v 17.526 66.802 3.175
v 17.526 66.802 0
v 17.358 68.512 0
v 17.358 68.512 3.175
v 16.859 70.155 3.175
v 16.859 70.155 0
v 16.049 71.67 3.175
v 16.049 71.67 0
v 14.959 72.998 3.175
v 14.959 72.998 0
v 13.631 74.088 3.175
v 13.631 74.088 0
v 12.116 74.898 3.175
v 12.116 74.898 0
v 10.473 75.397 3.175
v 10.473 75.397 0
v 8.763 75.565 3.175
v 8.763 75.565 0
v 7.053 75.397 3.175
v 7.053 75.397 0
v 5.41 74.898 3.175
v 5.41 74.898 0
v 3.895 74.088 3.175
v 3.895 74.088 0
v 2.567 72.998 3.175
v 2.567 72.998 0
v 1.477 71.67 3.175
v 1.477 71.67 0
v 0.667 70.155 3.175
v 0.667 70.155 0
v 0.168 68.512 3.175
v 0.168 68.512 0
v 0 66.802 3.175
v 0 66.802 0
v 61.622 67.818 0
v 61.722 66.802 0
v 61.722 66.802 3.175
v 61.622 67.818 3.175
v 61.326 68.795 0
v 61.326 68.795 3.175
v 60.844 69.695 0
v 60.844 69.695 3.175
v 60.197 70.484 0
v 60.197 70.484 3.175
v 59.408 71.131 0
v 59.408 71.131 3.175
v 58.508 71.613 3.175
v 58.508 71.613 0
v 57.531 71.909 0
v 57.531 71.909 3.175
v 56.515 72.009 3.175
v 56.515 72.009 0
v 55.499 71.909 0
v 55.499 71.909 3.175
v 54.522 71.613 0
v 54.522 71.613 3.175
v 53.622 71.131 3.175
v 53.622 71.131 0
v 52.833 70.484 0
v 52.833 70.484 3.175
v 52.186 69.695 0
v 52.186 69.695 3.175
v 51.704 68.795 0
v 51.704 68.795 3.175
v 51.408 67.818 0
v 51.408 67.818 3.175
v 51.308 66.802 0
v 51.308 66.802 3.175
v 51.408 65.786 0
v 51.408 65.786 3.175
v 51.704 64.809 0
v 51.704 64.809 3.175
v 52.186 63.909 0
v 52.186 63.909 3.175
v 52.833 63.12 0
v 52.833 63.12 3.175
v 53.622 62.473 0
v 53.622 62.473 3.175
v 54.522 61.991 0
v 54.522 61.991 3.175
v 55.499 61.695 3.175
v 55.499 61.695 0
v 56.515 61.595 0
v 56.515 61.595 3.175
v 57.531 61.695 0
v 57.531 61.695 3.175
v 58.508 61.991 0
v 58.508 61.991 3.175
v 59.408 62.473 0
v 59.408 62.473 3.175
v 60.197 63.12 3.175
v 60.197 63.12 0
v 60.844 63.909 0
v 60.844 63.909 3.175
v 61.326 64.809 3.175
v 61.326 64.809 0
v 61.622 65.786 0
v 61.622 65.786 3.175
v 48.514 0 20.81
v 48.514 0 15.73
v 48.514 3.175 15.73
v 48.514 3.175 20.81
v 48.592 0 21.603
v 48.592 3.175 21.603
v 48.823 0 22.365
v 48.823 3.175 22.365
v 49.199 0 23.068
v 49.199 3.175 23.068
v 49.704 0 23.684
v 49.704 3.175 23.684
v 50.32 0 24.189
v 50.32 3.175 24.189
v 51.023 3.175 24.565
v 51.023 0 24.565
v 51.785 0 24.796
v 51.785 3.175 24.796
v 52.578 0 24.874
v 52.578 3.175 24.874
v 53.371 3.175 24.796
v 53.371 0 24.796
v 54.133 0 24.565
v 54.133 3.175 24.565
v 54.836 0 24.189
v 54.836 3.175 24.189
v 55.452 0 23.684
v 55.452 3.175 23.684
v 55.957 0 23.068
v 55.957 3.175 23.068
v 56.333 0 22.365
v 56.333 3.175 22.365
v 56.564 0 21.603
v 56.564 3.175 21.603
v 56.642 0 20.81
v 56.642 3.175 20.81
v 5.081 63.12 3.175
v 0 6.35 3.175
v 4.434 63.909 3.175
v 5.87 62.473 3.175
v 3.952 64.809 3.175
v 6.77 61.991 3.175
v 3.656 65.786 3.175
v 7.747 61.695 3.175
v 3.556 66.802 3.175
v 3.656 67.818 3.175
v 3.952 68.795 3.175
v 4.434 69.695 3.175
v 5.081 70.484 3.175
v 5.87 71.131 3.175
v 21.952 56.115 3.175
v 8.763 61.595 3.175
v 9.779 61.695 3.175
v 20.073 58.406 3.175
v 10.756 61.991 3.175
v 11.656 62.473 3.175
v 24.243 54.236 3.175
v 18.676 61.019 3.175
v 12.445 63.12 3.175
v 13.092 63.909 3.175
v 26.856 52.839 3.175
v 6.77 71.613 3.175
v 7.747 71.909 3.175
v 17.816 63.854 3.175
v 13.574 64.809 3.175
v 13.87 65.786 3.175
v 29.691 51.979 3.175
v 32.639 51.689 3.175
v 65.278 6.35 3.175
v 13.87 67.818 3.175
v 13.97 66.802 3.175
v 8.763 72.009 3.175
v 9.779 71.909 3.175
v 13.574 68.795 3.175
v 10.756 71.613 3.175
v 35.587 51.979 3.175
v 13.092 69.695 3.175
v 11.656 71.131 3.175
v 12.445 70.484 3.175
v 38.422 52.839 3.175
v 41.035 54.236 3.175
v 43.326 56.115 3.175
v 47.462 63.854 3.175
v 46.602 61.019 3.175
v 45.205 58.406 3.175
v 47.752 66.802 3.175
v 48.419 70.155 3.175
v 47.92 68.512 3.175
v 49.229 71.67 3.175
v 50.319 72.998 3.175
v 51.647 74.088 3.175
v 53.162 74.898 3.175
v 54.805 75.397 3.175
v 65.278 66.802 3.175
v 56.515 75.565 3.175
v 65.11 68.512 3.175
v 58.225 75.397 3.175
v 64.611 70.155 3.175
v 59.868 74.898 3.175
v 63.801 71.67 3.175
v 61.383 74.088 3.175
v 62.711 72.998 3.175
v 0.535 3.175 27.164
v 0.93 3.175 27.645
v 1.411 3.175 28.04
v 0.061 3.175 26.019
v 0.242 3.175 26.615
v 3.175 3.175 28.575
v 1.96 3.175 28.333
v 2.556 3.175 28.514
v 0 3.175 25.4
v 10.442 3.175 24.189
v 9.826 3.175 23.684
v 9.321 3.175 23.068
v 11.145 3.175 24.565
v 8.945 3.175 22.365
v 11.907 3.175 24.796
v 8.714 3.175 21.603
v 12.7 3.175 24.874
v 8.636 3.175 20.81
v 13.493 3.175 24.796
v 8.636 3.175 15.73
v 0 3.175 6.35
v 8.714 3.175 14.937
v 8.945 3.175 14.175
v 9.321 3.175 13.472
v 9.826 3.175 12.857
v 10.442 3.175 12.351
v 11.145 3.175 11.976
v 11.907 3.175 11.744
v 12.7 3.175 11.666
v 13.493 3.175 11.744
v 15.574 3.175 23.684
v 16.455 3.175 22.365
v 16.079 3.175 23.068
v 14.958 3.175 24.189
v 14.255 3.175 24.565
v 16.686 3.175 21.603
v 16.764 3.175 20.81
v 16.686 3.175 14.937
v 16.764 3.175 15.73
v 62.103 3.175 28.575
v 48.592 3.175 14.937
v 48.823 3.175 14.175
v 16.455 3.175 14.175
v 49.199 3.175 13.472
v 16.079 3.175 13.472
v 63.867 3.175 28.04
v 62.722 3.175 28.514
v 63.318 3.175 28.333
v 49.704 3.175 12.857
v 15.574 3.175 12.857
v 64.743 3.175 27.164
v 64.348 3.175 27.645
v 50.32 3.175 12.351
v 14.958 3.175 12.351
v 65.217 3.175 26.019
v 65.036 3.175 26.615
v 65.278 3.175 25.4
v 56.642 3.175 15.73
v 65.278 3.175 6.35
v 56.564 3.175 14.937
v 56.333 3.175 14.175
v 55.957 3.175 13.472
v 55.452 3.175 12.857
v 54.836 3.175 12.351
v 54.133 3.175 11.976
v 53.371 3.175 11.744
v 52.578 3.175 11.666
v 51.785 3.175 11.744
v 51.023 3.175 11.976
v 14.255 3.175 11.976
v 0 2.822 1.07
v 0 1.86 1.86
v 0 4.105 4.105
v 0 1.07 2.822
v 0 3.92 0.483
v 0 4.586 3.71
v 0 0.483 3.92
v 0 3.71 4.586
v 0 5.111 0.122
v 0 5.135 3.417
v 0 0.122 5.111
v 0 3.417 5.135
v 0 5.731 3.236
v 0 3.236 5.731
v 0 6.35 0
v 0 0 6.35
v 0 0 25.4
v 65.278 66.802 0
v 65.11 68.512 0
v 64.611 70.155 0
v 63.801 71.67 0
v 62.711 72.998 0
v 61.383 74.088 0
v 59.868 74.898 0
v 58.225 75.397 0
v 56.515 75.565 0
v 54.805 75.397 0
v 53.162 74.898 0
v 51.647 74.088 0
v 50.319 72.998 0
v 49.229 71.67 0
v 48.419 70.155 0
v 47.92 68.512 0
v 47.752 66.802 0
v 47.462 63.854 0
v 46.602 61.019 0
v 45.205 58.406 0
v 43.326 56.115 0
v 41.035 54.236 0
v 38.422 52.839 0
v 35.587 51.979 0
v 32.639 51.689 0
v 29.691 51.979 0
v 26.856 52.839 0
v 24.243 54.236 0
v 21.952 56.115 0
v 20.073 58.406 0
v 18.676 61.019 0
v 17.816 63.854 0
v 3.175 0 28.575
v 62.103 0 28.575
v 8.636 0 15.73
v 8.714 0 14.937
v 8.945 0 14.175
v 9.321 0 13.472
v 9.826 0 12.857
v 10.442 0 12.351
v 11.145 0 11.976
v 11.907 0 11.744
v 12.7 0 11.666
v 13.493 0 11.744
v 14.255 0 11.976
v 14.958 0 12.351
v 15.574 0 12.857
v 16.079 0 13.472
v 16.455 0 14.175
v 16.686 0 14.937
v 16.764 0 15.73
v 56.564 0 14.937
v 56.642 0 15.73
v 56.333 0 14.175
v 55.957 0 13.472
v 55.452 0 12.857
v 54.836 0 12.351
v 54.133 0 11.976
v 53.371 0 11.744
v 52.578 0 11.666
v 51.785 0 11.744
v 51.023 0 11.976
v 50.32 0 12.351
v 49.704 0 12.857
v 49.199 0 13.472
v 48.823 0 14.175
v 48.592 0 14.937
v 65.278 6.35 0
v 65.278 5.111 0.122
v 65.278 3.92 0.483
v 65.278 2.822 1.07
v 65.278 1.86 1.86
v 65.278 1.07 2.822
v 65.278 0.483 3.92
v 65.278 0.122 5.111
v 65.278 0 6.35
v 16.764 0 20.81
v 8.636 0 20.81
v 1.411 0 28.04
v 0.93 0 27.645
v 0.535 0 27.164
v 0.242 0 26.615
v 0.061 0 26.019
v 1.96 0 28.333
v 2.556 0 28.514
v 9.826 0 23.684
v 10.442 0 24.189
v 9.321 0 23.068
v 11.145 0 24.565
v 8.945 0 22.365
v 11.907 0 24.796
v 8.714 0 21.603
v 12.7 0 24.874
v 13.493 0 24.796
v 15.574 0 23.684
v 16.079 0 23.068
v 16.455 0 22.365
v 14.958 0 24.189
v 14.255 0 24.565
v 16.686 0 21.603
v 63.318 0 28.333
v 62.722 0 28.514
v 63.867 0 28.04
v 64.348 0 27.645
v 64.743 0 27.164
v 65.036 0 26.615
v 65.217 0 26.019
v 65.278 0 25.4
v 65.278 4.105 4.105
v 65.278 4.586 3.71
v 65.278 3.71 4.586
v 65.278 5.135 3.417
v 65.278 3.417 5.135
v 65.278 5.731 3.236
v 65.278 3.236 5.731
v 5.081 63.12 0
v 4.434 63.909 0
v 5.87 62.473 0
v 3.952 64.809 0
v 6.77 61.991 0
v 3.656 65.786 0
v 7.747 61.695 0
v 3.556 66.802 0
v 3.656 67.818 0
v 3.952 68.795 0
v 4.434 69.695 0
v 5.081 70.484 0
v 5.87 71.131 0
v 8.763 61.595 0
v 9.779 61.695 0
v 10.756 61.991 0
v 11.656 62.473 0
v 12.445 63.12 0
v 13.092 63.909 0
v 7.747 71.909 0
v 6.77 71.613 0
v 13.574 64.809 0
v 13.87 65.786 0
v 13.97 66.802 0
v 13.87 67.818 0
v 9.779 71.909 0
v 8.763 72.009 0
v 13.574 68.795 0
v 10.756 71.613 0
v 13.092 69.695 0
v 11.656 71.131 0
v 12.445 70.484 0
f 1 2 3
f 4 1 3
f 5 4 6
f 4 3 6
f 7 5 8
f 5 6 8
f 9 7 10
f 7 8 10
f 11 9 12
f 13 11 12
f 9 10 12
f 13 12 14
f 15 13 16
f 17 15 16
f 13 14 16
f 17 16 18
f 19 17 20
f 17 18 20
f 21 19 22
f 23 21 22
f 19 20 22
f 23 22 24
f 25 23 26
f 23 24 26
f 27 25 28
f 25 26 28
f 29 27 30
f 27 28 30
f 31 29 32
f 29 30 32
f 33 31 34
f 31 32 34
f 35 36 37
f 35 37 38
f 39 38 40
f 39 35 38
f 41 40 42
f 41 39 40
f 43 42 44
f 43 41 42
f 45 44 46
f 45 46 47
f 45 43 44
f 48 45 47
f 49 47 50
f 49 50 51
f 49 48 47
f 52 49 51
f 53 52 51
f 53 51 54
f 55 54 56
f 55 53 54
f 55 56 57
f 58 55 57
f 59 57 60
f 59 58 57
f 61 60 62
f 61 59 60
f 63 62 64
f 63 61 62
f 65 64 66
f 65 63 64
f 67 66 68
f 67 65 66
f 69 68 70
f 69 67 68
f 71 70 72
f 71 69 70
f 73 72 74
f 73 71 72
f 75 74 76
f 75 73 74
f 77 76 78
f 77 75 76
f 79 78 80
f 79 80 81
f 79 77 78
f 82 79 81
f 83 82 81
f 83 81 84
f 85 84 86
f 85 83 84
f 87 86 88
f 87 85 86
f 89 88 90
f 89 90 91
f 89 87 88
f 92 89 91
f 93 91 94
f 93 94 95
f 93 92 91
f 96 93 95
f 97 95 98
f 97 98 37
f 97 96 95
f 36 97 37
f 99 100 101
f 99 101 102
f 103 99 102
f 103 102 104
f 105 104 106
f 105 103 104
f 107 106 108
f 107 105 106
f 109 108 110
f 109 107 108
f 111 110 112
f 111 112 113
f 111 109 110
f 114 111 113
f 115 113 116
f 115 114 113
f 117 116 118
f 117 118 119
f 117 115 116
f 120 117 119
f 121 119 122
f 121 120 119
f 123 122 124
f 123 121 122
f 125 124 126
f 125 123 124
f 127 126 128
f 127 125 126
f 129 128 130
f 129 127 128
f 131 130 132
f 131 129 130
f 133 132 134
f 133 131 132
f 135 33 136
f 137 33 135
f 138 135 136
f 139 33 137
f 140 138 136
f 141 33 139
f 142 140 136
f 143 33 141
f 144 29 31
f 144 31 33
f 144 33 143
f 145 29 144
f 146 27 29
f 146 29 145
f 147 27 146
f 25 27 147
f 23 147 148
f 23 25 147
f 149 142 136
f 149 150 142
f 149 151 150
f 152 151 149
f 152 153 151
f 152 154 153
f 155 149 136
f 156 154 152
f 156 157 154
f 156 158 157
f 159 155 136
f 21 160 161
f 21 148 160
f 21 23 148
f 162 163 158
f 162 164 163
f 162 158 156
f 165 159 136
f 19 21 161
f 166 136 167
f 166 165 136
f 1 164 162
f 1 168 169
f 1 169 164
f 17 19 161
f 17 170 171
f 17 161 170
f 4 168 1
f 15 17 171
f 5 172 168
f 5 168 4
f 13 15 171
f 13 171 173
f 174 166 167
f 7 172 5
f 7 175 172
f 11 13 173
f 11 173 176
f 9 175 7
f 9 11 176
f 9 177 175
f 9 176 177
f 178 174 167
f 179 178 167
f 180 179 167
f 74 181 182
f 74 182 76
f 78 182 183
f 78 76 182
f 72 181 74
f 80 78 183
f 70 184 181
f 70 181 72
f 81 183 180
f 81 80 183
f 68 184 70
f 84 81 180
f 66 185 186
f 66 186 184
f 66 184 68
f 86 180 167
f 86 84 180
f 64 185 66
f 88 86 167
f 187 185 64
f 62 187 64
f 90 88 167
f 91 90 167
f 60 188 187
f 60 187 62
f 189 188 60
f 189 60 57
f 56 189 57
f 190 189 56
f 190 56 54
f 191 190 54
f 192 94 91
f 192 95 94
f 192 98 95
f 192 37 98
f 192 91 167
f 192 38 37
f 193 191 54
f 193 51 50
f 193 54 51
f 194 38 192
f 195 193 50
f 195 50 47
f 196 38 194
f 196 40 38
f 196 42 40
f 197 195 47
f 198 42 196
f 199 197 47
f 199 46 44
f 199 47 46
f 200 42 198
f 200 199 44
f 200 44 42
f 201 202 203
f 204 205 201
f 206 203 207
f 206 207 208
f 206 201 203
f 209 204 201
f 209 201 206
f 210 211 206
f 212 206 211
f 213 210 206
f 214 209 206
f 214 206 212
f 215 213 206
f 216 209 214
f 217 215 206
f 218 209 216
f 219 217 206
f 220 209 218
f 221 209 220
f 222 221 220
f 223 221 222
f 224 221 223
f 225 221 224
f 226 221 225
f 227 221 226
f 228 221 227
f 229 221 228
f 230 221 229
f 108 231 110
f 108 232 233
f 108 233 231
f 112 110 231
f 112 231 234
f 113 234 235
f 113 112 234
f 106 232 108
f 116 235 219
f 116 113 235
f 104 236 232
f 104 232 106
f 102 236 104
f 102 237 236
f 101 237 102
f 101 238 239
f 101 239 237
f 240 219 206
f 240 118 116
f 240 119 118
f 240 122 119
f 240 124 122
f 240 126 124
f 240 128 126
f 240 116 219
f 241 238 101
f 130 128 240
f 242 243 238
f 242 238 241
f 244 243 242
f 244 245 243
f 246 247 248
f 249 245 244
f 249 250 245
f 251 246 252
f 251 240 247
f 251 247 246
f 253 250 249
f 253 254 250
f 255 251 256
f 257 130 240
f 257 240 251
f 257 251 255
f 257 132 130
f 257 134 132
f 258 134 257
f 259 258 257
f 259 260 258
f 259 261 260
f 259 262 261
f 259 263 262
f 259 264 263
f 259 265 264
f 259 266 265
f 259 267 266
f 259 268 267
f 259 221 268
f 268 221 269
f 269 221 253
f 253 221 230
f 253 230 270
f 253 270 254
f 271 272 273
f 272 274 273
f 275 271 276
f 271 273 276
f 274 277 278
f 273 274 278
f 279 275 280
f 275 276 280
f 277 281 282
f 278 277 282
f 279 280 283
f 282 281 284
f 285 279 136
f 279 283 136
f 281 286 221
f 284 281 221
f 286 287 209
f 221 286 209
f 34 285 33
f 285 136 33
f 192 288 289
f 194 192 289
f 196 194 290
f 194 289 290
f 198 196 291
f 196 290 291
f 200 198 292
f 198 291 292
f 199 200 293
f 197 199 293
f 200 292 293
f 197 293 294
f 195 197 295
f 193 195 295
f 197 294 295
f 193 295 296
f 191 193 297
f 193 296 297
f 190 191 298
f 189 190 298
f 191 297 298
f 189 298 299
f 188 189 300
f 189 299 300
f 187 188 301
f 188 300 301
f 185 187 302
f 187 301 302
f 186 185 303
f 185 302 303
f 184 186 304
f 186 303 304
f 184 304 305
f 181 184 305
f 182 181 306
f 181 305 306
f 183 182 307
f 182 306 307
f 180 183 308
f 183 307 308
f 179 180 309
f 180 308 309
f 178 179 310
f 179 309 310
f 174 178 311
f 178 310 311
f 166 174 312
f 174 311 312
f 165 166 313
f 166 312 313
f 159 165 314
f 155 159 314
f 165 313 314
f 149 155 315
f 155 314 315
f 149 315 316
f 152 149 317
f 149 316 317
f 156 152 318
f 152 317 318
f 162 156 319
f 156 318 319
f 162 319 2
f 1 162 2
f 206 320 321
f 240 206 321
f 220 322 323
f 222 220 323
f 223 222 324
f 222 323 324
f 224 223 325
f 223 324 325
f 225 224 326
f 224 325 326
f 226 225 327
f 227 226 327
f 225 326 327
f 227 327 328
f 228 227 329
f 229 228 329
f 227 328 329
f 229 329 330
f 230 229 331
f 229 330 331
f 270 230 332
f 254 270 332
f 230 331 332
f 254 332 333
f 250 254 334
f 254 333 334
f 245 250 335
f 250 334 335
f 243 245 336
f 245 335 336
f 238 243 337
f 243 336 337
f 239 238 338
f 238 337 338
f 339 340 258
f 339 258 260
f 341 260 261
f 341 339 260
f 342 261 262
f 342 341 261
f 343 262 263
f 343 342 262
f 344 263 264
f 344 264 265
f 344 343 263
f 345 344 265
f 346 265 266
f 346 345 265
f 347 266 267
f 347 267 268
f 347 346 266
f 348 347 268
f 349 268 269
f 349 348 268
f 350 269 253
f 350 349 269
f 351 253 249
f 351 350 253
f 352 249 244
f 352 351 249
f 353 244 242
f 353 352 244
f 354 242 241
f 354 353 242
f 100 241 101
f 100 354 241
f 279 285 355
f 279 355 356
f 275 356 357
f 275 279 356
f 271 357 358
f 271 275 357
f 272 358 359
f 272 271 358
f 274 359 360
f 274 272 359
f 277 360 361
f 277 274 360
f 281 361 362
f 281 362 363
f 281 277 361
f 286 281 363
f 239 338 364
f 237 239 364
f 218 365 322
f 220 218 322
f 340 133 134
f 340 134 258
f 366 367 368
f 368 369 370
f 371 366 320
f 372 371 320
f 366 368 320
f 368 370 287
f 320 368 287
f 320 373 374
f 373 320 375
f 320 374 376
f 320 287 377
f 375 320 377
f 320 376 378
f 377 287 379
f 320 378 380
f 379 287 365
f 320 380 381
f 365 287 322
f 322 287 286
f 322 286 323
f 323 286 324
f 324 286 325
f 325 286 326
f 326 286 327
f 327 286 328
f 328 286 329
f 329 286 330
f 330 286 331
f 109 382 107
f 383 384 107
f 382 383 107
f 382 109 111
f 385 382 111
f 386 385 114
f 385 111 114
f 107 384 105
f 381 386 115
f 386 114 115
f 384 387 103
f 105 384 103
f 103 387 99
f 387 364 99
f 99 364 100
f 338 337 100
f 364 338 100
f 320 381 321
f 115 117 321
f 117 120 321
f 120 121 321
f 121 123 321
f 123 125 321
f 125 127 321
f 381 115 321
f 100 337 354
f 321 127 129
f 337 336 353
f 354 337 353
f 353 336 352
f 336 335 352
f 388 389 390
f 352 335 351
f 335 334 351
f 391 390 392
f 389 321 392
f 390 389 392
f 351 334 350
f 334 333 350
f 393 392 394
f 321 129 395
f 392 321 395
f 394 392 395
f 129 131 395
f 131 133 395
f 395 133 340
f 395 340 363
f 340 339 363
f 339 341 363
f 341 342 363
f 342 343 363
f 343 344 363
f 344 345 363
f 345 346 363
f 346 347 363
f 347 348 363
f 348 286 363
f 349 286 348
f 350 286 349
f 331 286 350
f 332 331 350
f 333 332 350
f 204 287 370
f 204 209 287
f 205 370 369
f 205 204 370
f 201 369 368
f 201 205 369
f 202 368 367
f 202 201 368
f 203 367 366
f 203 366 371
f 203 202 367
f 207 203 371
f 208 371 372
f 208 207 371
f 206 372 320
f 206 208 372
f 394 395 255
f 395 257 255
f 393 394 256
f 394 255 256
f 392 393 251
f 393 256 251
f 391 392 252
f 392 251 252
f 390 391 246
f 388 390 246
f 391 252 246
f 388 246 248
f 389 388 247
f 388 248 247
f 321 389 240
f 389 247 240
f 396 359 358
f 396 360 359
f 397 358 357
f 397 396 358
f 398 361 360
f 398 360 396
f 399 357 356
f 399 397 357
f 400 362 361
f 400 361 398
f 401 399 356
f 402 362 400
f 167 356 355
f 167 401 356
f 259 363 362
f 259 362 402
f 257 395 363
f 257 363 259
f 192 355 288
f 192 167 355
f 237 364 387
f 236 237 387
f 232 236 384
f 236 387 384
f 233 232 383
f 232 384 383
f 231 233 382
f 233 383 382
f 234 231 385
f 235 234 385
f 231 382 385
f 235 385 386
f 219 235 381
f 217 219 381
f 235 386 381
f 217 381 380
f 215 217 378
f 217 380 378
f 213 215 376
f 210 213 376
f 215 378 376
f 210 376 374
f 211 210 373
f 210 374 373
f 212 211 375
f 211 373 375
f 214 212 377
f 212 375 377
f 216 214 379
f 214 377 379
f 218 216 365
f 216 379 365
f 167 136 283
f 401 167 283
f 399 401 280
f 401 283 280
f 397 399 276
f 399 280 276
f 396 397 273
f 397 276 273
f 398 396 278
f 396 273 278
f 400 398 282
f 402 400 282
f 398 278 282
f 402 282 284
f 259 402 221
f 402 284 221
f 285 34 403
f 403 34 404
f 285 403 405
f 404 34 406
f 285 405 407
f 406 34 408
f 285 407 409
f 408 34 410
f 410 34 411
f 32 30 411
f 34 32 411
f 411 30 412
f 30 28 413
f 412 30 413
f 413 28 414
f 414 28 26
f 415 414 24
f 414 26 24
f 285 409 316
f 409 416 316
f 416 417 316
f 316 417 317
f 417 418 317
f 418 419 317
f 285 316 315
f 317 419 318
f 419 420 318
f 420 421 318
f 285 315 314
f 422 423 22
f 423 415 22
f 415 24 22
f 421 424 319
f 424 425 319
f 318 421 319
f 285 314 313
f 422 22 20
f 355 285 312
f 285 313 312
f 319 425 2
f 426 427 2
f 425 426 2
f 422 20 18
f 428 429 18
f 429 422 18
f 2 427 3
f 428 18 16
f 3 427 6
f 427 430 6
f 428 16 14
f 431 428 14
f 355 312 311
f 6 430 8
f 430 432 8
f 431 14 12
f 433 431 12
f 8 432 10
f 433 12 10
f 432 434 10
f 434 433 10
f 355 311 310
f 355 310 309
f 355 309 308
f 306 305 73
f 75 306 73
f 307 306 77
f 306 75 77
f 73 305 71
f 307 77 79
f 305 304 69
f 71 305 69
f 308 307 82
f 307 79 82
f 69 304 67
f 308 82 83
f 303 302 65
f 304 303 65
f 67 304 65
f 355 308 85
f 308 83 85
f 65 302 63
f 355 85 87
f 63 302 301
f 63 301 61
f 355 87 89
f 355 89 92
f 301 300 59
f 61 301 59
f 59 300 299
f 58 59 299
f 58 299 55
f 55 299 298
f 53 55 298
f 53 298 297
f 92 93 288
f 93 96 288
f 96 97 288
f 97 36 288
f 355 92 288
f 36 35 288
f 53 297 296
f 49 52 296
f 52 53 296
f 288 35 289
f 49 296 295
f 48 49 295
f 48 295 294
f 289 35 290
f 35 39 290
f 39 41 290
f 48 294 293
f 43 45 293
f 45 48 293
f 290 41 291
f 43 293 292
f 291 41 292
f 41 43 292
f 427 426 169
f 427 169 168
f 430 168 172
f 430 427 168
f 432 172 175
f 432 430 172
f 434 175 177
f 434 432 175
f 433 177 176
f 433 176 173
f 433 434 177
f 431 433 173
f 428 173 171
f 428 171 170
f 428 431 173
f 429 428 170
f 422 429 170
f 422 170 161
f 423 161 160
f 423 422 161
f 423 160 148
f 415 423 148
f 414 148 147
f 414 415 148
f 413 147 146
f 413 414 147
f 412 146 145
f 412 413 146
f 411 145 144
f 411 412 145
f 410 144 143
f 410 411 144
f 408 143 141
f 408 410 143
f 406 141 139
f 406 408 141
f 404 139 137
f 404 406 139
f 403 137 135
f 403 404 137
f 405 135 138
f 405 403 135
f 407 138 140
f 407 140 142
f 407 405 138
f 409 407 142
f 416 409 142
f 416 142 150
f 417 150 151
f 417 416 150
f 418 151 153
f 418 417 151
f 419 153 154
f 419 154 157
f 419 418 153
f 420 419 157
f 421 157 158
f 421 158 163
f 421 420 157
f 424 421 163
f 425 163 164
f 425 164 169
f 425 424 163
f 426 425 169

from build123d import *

# Parameters (mm, degrees)
SKETCH1_R              = 5.207
BOSS_EXTRUDE1_DEPTH    = 3.175
SKETCH2_W              = 65.278
SKETCH2_H              = 25.4
BOSS_EXTRUDE2_DEPTH    = 3.175
FILLET1_R              = 3.175
CONVERT_SOLID1_DEPTH   = 65.278
CONVERT_SOLID1_2_DEPTH = 65.278


# Read off the part's stored shape, not the designer's step: Convert-Solid1
with BuildPart() as part:
    # Sketch1 → Boss-Extrude1 (new body)
    with BuildSketch(Plane.XY):
        with BuildLine():
            Line((0, 0), (65.278, 0))
            Line((65.278, 0), (65.278, 66.802))
            ThreePointArc((65.278, 66.802), (56.515, 75.565), (47.752, 66.802))
            ThreePointArc((47.752, 66.802), (32.639, 51.689), (17.526, 66.802))
            ThreePointArc((17.526, 66.802), (8.763, 75.565), (0, 66.802))
            Line((0, 66.802), (0, 0))
        make_face()
        with Locations((8.763, 66.802)):
            Circle(SKETCH1_R, mode=Mode.SUBTRACT)
        with Locations((56.515, 66.802)):
            Circle(SKETCH1_R, mode=Mode.SUBTRACT)
    extrude(amount=BOSS_EXTRUDE1_DEPTH)

    # Sketch2 → Boss-Extrude2 (add)
    with BuildSketch(Plane(origin=(0, 0, 0), x_dir=(1, 0, 0), z_dir=(0, 1, 0))):
        with Locations((32.639, -15.875)):
            Rectangle(SKETCH2_W, SKETCH2_H)
        with BuildLine():
            Line((16.764, -15.73022), (16.764, -20.81022))
            ThreePointArc((16.764, -20.81022), (12.7, -24.87422), (8.636, -20.81022))
            Line((8.636, -20.81022), (8.636, -15.73022))
            ThreePointArc((8.636, -15.73022), (12.7, -11.66622), (16.764, -15.73022))
        make_face(mode=Mode.SUBTRACT)
        with BuildLine():
            Line((48.514, -15.73022), (48.514, -20.81022))
            ThreePointArc((48.514, -20.81022), (52.578, -24.87422), (56.642, -20.81022))
            Line((56.642, -20.81022), (56.642, -15.73022))
            ThreePointArc((56.642, -15.73022), (52.578, -11.66622), (48.514, -15.73022))
        make_face(mode=Mode.SUBTRACT)
    extrude(amount=BOSS_EXTRUDE2_DEPTH)

    # Fillet1
    fillet1_edges = [part.edges().sort_by_distance(p)[0] for p in [
        (0, 1.5875, 28.575),
        (65.278, 1.5875, 28.575),
    ]]
    fillet(fillet1_edges, radius=FILLET1_R)

    # Convert-Solid1 outline → Convert-Solid1 (cut)
    with BuildSketch(Plane.YZ):
        with BuildLine():
            ThreePointArc((6.35, 0), (1.859871939, 1.859871939), (0, 6.35))
            Line((0, 6.35), (0, 0))
            Line((0, 0), (6.35, 0))
        make_face()
    extrude(amount=CONVERT_SOLID1_DEPTH, mode=Mode.SUBTRACT)

    # Convert-Solid1 2 outline → Convert-Solid1 2 (add)
    with BuildSketch(Plane.YZ):
        with BuildLine():
            ThreePointArc((6.35, 3.175), (4.10493597, 4.10493597), (3.175, 6.35))
            Line((3.175, 6.35), (3.175, 3.175))
            Line((3.175, 3.175), (6.35, 3.175))
        make_face()
    extrude(amount=CONVERT_SOLID1_2_DEPTH)


solid = part.part
